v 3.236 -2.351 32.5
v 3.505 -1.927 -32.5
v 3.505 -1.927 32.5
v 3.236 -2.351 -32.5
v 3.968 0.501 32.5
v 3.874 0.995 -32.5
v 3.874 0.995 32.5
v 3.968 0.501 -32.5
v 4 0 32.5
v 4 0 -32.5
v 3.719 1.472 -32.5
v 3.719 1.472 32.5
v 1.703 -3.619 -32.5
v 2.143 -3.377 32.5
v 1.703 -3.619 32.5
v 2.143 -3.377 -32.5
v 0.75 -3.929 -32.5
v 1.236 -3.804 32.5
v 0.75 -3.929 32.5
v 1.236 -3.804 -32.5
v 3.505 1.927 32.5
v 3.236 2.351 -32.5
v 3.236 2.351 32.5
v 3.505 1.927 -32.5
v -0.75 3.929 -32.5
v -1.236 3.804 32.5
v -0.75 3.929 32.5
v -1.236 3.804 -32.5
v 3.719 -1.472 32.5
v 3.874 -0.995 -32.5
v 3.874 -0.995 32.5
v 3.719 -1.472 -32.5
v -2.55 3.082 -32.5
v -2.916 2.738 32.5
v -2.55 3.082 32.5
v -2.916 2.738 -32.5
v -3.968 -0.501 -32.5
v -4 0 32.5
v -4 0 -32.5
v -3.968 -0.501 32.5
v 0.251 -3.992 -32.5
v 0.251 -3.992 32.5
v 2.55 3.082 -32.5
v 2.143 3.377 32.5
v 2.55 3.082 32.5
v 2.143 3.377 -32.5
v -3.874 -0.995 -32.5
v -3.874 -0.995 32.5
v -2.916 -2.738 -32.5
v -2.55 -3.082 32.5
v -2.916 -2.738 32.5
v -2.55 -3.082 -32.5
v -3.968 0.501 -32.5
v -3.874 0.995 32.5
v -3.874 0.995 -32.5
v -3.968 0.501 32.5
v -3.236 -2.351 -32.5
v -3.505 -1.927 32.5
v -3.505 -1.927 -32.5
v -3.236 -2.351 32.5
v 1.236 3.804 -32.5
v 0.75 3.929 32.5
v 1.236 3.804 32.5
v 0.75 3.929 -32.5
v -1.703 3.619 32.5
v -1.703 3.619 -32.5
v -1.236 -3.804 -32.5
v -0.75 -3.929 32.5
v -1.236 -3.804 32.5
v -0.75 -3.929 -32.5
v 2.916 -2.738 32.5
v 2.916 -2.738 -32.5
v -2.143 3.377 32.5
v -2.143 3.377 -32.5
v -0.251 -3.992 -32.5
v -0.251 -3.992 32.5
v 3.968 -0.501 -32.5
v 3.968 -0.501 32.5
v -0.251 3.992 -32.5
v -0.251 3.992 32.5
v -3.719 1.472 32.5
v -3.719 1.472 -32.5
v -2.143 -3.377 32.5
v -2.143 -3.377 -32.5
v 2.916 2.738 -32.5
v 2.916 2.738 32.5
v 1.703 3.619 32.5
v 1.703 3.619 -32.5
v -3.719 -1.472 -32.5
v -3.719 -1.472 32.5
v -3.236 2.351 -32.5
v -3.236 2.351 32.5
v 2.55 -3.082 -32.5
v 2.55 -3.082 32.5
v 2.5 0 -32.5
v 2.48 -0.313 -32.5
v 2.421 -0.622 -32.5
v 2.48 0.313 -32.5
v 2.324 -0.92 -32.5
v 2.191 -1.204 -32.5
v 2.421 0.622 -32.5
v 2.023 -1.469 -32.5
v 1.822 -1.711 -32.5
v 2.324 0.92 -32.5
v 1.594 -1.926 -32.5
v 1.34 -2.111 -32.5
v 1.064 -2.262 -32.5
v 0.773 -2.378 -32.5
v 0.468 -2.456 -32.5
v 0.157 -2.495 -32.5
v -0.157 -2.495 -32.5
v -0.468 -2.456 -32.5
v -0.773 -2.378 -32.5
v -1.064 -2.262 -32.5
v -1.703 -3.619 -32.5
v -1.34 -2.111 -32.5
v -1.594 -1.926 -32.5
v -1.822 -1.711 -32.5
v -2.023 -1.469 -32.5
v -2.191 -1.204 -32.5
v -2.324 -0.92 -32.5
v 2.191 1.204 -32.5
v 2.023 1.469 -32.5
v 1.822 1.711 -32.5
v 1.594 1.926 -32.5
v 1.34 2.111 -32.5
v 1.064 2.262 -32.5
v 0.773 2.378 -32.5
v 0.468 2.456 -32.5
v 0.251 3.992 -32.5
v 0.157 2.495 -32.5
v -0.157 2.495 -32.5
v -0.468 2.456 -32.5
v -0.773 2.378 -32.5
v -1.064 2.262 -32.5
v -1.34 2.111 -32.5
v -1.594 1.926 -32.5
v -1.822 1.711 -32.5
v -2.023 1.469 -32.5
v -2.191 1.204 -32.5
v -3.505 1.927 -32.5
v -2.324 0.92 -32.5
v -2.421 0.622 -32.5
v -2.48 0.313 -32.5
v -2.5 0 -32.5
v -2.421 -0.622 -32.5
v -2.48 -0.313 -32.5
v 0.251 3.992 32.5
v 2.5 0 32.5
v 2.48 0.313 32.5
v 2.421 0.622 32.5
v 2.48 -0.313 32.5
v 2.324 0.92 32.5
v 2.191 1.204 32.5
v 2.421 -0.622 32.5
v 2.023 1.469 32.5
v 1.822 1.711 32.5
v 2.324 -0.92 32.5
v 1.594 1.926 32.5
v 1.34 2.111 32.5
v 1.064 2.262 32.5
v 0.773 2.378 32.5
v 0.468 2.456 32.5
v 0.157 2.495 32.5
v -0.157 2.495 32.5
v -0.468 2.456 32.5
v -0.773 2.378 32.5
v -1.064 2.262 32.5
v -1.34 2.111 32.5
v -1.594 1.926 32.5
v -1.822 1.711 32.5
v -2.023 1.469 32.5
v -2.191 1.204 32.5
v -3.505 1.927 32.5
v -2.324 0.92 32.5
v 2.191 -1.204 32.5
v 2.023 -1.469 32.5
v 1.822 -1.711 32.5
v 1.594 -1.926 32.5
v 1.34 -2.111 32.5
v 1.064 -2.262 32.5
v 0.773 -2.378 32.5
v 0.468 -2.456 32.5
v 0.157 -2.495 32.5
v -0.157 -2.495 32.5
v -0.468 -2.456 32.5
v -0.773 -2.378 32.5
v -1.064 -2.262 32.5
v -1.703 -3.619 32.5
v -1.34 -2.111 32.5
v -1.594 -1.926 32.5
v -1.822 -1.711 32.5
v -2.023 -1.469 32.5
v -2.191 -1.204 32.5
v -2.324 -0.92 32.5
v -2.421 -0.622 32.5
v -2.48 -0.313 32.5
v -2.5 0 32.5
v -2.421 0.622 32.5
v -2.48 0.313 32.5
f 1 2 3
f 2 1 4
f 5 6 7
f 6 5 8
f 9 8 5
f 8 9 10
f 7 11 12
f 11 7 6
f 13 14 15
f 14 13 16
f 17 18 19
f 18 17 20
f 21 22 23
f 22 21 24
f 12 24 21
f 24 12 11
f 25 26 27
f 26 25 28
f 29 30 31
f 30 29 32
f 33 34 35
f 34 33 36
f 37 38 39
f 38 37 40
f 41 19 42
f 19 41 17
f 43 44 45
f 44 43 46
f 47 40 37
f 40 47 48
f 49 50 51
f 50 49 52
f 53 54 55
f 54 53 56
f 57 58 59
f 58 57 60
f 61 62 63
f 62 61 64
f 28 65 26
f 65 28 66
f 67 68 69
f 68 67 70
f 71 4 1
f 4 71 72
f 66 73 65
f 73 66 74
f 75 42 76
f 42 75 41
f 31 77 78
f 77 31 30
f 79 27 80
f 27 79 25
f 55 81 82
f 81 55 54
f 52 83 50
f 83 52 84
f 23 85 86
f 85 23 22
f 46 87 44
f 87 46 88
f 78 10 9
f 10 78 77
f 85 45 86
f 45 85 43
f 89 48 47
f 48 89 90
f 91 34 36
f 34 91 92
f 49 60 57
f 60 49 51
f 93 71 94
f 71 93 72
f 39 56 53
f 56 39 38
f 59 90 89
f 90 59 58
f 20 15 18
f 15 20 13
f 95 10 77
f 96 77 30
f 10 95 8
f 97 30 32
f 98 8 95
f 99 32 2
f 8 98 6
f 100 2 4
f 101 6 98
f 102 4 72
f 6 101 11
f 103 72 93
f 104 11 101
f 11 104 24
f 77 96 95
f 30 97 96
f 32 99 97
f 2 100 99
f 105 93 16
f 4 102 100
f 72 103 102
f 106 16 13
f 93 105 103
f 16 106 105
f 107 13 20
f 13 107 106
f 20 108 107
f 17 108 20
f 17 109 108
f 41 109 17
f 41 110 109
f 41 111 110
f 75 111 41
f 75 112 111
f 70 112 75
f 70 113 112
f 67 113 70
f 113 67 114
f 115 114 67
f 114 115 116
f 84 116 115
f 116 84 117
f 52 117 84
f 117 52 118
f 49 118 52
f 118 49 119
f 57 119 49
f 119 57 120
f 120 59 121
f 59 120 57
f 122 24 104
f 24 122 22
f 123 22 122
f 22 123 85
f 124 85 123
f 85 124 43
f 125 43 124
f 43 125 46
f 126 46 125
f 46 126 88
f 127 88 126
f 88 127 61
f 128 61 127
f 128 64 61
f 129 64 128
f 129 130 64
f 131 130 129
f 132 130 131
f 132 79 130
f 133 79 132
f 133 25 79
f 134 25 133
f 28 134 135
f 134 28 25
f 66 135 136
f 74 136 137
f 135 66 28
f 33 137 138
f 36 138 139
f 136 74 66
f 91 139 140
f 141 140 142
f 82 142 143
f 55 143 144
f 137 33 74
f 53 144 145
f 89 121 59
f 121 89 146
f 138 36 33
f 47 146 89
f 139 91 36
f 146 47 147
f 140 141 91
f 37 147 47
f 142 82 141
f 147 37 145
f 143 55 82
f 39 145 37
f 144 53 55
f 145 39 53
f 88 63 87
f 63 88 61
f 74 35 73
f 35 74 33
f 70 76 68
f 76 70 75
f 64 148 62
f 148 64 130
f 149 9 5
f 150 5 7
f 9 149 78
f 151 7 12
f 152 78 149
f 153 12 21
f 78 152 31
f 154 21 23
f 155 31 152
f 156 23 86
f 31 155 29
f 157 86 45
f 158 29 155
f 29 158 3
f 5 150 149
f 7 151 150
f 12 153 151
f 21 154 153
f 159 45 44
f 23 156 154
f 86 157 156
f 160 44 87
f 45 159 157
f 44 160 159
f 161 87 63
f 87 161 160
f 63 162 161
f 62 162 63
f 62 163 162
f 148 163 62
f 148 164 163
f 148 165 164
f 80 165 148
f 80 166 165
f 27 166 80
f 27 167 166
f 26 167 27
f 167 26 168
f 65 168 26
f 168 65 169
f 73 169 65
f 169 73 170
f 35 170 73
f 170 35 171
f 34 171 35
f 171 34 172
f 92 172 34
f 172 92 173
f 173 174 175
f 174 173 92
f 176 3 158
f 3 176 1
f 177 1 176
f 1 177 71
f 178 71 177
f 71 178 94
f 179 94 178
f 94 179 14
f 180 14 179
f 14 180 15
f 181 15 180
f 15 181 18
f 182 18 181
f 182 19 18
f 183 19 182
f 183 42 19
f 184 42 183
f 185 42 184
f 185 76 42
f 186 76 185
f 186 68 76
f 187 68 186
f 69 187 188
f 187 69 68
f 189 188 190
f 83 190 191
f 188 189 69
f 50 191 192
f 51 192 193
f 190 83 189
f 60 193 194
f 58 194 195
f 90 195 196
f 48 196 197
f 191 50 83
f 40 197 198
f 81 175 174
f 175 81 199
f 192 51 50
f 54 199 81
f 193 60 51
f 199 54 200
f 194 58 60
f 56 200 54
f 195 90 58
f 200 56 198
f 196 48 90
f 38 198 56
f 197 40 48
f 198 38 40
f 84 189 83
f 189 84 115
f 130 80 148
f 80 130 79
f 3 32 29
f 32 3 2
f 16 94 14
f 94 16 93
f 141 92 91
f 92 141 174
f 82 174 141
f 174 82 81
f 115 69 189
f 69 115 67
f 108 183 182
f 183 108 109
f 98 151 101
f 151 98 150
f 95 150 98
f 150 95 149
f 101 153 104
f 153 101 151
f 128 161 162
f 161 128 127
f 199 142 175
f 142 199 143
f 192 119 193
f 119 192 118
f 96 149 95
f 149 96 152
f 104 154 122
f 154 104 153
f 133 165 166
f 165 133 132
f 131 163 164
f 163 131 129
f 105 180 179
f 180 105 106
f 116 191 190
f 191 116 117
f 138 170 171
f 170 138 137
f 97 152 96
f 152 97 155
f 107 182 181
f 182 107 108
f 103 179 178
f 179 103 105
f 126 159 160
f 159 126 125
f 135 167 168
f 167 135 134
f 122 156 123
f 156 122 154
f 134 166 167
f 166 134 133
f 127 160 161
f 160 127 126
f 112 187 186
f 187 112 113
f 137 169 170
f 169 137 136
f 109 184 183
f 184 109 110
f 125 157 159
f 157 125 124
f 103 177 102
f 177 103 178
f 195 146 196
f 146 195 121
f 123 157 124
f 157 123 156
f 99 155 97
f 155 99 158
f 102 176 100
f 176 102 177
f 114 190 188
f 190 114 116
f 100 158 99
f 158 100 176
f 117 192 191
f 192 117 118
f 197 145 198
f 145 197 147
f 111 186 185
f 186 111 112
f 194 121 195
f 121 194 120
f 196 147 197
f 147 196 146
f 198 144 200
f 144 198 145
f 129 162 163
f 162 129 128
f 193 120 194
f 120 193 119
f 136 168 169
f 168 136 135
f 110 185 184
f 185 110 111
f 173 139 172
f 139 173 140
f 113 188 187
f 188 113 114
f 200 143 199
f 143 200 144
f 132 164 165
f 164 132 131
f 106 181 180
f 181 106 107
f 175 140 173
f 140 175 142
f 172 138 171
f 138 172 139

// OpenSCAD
$fn = 50;


difference() {
	union() {
		translate(v = [0, 0, -32.5000000000]) {
			cylinder(h = 65, r = 4.0000000000);
		}
	}
	union() {
		translate(v = [0, 0, -100.0000000000]) {
			cylinder(h = 200, r = 2.5000000000);
		}
	}
}
